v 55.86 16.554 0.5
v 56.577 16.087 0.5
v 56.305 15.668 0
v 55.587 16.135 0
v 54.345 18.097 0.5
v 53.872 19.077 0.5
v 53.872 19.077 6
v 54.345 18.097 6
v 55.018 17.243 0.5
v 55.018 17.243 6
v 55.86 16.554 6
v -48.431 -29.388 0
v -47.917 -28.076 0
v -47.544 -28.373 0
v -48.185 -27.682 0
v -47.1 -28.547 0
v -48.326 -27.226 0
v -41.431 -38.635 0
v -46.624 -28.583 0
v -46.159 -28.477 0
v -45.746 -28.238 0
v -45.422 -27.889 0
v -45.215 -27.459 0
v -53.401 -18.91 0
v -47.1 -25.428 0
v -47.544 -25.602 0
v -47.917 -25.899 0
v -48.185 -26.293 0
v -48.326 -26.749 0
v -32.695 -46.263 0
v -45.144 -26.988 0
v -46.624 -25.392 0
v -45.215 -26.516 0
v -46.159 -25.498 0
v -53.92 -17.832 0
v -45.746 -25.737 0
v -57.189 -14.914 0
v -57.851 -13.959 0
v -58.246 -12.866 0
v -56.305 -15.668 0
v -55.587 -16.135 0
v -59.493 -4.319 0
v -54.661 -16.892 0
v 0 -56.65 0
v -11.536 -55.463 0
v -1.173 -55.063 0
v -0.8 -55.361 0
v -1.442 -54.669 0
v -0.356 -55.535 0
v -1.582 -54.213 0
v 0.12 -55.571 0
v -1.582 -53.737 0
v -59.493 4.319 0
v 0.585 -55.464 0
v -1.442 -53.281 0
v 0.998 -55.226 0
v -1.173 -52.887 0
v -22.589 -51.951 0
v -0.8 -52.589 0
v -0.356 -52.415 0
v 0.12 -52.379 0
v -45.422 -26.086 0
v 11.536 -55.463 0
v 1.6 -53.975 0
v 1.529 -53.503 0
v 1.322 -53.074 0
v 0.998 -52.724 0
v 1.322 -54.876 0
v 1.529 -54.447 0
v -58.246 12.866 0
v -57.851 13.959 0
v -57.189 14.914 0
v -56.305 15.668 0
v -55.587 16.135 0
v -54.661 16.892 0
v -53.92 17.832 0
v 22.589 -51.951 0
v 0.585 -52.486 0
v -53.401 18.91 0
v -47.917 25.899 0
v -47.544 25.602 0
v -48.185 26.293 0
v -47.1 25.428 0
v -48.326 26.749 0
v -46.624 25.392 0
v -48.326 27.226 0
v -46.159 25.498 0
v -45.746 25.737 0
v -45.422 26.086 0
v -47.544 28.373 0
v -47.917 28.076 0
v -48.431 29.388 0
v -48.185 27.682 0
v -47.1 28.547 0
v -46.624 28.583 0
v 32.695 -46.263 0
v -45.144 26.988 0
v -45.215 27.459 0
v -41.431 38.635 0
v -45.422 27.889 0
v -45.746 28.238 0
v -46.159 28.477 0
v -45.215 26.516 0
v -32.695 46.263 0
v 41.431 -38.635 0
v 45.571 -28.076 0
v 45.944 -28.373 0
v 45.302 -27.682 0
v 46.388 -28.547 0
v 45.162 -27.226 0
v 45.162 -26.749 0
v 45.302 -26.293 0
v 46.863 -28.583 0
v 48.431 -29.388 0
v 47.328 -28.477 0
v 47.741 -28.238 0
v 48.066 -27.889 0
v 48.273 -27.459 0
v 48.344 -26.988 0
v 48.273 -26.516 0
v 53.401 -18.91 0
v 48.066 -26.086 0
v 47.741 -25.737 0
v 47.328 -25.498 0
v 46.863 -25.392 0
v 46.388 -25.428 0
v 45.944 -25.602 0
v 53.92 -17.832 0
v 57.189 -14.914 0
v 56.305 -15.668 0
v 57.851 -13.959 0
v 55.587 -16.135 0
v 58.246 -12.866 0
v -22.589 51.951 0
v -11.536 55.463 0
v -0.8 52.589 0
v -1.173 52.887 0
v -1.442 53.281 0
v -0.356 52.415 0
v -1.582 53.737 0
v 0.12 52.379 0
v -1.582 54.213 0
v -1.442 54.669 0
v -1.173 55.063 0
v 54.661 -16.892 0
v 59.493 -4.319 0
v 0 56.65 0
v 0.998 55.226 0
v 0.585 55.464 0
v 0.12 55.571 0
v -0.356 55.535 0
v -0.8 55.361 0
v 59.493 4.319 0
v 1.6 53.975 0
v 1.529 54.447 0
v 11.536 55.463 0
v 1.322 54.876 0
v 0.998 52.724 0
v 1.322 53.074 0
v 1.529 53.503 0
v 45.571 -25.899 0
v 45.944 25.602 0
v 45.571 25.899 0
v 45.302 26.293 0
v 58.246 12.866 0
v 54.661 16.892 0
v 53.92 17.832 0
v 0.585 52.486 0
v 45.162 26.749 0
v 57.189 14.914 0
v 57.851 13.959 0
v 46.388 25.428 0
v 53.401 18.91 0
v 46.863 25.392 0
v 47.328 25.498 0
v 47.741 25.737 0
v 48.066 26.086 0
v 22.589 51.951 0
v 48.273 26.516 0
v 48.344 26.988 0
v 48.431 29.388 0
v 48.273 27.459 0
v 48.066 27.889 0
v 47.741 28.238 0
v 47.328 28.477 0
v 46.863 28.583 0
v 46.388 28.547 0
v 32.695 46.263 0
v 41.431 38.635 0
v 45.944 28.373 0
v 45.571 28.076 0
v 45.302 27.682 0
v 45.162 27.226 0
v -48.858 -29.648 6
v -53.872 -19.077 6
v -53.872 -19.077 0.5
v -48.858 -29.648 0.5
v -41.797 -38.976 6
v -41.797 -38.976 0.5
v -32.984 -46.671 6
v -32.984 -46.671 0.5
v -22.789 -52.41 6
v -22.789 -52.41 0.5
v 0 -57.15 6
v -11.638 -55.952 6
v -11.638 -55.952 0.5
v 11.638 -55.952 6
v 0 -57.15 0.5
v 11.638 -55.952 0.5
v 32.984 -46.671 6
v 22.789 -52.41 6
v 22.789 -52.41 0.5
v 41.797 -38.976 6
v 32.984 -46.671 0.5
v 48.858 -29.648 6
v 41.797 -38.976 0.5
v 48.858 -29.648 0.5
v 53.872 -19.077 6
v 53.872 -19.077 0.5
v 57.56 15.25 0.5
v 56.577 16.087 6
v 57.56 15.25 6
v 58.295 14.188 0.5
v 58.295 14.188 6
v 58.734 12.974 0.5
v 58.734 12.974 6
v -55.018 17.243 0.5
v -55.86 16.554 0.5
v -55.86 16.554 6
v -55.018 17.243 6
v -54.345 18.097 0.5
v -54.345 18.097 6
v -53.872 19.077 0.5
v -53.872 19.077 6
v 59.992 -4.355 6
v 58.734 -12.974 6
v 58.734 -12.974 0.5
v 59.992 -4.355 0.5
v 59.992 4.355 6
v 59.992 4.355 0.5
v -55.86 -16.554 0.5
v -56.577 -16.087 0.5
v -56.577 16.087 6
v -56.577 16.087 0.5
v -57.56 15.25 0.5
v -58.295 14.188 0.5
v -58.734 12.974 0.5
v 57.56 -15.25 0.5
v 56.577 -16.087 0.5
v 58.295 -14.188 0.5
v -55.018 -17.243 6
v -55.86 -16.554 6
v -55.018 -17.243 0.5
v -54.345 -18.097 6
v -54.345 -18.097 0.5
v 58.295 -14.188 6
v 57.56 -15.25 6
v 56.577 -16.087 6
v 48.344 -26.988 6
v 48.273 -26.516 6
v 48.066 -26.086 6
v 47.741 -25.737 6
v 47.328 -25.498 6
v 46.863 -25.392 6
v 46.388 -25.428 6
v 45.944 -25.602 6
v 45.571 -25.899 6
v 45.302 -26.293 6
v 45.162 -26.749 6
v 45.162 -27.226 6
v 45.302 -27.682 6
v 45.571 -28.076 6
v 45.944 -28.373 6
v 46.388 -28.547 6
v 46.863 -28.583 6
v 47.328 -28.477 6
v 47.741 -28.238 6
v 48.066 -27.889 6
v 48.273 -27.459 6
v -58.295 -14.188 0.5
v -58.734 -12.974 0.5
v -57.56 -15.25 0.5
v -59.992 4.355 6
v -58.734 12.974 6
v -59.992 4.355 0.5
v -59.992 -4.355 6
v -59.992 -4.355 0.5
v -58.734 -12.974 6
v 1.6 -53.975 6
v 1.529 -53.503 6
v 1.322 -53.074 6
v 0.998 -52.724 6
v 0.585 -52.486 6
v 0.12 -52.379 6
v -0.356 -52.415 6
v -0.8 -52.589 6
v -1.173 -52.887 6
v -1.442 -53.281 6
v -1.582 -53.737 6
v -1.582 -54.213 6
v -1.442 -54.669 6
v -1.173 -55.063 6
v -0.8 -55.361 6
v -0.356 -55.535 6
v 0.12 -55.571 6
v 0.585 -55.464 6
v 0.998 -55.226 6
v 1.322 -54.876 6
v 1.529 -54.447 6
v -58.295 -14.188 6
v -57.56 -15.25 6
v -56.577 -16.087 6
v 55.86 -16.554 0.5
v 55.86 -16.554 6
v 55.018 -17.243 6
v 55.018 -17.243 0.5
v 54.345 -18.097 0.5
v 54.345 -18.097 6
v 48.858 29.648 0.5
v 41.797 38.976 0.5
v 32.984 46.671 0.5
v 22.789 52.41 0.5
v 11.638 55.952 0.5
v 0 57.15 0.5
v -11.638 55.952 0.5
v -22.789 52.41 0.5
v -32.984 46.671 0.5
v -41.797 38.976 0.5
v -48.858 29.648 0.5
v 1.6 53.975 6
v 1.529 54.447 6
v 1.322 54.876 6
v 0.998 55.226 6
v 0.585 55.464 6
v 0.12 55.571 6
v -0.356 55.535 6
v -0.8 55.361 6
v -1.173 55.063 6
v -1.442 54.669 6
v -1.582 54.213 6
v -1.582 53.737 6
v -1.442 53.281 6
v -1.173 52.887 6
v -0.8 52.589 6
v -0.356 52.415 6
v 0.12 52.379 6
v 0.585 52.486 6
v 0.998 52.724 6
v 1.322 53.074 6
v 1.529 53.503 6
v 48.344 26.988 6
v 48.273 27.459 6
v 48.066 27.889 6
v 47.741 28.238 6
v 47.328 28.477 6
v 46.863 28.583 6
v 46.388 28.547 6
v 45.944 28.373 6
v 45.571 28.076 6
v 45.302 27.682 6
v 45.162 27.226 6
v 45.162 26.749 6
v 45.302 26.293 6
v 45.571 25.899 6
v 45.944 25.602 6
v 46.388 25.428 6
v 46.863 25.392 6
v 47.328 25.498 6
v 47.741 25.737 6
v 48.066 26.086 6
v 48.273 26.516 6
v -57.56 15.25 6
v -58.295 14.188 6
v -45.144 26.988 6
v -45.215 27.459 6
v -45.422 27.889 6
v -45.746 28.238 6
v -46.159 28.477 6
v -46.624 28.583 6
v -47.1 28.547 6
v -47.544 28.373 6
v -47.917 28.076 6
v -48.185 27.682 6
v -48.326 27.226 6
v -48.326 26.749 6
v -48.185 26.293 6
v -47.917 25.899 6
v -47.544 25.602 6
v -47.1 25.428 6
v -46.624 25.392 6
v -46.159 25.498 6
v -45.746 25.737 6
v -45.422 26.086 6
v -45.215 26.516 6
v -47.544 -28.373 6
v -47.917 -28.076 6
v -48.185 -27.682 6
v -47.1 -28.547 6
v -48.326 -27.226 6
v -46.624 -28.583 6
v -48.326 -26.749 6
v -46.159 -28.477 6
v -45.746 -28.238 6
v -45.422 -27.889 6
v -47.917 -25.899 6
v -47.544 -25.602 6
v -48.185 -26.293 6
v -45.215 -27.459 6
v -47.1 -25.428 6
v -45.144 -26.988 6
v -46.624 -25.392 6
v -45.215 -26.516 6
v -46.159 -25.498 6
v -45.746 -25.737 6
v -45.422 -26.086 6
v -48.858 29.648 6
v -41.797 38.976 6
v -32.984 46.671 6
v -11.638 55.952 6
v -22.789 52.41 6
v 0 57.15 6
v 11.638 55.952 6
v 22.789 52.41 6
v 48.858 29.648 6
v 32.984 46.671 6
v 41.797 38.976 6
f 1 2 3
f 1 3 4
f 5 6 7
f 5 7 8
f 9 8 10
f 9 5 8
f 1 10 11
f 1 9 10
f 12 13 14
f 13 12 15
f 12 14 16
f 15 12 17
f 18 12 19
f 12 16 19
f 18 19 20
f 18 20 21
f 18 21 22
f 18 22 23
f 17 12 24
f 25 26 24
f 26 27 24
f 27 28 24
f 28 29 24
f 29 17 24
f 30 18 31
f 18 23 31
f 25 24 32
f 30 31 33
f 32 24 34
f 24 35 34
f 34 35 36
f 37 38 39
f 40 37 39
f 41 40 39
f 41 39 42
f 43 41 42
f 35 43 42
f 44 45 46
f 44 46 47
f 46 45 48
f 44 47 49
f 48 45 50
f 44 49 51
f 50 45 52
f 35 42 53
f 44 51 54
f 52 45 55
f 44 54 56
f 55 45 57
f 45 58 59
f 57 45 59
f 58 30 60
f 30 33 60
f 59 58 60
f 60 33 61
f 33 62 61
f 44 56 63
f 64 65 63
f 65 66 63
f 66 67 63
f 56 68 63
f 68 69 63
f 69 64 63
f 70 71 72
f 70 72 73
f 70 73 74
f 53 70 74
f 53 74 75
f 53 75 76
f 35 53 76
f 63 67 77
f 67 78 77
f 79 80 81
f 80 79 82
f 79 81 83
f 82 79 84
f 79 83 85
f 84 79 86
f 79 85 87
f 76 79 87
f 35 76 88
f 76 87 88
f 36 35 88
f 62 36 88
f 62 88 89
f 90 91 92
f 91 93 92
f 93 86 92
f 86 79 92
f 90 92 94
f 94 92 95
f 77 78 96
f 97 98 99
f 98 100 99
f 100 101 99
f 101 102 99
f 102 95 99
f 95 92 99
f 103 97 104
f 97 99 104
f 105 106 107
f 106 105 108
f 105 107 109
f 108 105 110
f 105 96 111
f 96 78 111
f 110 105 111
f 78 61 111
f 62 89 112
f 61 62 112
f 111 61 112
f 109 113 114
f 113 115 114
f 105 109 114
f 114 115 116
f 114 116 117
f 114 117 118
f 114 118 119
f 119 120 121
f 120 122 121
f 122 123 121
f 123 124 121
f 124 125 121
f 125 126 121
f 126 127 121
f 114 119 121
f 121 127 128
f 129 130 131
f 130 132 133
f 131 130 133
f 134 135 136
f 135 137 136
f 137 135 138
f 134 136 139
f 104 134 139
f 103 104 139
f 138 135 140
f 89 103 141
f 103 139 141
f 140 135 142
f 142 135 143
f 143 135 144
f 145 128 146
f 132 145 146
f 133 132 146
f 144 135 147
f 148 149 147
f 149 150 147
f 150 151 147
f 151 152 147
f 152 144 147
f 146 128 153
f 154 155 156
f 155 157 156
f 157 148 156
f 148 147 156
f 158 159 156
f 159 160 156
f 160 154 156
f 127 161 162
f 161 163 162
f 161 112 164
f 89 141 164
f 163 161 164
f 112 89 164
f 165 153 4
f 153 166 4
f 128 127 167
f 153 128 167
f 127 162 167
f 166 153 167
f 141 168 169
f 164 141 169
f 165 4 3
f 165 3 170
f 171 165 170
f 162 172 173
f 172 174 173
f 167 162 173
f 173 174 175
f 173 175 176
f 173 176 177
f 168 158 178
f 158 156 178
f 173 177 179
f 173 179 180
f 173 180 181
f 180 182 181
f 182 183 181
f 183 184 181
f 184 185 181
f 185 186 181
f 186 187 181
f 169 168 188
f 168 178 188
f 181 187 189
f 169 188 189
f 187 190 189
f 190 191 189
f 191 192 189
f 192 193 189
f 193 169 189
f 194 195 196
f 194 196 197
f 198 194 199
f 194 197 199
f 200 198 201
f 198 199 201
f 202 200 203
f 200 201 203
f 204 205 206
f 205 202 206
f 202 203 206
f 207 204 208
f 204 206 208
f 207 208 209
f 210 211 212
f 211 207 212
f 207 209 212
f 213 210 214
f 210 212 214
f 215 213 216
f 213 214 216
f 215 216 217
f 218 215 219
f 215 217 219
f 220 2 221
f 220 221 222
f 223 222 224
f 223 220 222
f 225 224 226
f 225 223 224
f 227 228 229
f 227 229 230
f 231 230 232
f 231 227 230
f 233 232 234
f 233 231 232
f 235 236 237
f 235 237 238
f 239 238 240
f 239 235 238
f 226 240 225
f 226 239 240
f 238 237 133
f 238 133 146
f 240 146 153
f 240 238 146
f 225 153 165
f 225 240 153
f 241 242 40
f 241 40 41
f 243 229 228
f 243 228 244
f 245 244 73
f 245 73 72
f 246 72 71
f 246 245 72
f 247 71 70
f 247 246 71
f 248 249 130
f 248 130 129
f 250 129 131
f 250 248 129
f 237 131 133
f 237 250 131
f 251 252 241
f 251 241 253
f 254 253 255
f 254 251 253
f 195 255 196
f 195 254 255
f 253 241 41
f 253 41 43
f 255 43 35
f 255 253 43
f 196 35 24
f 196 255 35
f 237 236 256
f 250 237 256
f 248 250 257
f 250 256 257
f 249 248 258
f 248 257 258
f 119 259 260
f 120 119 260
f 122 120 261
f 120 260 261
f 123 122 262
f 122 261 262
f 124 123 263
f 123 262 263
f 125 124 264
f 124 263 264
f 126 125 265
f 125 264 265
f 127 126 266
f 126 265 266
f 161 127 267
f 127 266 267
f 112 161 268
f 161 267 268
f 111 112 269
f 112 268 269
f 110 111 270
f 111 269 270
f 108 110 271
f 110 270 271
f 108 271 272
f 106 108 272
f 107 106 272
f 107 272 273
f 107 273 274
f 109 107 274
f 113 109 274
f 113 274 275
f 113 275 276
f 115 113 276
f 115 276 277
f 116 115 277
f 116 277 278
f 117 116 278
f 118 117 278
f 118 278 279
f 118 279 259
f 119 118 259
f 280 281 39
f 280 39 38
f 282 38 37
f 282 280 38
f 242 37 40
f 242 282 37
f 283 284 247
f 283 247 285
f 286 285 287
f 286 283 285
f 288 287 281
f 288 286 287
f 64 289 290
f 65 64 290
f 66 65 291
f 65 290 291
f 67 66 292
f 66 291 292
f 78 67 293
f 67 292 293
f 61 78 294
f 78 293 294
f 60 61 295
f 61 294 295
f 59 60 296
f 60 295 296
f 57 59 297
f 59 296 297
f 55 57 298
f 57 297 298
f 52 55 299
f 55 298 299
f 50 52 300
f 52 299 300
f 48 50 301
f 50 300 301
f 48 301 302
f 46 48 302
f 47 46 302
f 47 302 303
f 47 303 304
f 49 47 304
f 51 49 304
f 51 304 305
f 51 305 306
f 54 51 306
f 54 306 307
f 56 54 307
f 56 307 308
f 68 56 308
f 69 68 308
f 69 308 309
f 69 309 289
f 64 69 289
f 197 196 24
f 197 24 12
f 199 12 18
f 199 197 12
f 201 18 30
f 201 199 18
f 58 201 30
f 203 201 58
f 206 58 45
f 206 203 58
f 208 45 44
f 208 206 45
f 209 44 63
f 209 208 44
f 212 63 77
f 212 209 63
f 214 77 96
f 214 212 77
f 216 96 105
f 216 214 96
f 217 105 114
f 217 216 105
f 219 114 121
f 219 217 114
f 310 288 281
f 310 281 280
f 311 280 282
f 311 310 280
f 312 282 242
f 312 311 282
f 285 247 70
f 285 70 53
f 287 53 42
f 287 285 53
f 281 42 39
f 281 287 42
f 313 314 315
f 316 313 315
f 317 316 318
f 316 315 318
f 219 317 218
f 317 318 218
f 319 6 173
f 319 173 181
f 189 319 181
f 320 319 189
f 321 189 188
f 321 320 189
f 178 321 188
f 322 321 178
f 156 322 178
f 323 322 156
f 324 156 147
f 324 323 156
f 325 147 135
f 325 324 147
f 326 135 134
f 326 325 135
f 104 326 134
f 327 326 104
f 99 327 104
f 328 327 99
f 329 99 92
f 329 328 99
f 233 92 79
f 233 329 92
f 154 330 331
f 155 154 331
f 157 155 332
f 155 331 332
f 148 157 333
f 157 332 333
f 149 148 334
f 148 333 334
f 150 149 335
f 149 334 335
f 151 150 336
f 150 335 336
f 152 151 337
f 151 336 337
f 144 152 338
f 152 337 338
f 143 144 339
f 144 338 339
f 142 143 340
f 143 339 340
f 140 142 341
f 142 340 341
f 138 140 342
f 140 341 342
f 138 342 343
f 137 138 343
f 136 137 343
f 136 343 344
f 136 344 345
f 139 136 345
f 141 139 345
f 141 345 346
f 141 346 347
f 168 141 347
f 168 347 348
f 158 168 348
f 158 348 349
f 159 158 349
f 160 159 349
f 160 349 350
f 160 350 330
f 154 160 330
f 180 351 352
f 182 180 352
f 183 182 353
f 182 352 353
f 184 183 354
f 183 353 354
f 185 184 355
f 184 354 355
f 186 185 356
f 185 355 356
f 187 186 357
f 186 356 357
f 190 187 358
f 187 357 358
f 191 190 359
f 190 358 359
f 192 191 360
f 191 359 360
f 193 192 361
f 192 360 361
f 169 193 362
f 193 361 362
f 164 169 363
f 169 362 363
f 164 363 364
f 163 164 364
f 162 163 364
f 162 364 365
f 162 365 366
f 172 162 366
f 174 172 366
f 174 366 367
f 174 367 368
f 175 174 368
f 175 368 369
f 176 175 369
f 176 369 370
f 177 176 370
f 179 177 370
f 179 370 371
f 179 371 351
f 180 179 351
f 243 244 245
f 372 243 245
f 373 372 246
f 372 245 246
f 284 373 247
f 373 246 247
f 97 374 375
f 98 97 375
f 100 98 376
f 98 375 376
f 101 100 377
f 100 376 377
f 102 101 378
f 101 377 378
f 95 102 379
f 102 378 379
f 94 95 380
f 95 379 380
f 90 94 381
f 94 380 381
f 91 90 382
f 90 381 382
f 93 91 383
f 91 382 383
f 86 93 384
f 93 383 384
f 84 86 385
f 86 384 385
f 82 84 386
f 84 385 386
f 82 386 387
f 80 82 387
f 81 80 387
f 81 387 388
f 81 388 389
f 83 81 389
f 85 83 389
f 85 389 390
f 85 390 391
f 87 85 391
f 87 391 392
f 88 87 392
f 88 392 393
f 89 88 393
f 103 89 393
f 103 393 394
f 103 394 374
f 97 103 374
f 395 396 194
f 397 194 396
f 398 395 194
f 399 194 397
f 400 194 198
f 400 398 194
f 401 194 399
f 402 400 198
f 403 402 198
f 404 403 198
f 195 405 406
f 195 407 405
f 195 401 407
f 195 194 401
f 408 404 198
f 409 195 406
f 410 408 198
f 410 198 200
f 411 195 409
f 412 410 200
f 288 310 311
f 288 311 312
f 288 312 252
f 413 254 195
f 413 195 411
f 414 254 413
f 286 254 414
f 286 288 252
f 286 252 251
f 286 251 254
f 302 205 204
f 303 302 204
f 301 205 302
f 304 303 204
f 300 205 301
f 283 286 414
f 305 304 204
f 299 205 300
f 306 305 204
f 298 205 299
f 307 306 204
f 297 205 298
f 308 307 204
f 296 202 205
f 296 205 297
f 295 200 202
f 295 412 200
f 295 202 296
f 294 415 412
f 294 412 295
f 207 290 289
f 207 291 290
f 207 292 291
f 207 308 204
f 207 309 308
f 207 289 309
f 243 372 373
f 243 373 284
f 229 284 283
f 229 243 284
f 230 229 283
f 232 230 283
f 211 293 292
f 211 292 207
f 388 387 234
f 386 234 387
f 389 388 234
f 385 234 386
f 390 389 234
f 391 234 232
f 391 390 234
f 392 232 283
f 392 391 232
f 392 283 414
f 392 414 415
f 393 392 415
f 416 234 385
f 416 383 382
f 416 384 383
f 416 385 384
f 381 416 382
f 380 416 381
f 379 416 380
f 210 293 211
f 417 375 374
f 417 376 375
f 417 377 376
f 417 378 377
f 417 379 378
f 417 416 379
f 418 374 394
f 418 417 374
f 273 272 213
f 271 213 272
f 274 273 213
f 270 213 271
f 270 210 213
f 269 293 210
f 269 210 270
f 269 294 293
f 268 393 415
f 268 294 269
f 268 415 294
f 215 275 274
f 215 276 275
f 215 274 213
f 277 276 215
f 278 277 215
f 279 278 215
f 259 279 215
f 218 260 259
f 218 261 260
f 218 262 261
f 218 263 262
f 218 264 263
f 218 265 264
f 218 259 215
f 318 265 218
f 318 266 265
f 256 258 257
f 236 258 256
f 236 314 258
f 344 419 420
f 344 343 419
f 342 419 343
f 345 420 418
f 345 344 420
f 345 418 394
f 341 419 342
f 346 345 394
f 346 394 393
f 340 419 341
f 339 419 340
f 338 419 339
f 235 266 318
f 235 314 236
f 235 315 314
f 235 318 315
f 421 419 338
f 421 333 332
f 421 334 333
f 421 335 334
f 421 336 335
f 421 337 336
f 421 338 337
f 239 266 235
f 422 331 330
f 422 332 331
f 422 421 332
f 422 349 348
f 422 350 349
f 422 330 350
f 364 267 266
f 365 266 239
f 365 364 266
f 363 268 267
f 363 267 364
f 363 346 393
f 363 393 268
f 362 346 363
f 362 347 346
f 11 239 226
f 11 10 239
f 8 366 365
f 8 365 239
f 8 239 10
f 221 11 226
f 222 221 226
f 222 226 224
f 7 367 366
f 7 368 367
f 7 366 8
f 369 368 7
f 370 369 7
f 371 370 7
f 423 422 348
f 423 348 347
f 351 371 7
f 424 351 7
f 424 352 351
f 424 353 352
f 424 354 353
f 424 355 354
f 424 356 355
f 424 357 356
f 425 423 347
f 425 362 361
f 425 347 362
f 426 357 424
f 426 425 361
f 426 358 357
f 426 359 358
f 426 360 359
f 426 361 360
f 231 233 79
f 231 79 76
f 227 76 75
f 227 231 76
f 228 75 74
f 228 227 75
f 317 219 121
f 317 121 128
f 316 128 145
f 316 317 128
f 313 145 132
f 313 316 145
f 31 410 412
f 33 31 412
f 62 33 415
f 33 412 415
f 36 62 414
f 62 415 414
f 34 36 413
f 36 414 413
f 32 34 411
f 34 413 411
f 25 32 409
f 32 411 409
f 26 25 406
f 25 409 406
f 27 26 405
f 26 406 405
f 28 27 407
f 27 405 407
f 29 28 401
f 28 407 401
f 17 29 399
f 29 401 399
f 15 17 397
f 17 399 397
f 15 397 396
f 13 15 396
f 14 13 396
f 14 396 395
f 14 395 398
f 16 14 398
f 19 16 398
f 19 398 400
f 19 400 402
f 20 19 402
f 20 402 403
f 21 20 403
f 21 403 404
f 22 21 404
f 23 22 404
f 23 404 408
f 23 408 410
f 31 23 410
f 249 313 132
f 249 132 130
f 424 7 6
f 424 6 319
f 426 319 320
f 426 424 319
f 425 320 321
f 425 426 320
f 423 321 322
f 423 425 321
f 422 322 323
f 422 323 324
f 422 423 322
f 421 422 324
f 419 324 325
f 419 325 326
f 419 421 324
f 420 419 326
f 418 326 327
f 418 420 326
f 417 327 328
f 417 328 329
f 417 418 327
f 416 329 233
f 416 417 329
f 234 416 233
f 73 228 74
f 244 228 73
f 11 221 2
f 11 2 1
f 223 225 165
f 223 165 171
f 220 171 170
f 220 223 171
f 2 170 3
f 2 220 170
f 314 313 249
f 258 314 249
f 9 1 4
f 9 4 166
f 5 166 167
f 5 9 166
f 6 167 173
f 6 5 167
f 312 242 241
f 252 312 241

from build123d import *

# Parameters (mm, degrees)
EXTRUDE_1_DEPTH             = 6
CUT_EXTRUDE_1_DEPTH         = 7
HOLE_WIZARD_3_2_3_2_1_D     = 3.2
HOLE_WIZARD_3_2_3_2_1_DEPTH = 6
FILLET_1_R                  = 5
CHAMFER_1_SIZE              = 0.5


with BuildPart() as part:
    # 草图1 → 凸台-拉伸1 (new body)
    with BuildSketch(Plane.XY.offset(6)):
        with BuildLine():
            Line((-54.404710274, 17.5), (-58.249656651, 15))
            ThreePointArc((-58.249656651, 15), (0, -60.15), (58.249656651, 15))
            Line((58.249656651, 15), (54.404710274, 17.5))
            ThreePointArc((54.404710274, 17.5), (0, 57.15), (-54.404710274, 17.5))
        make_face()
    extrude(amount=-EXTRUDE_1_DEPTH)

    # 草图2 → 切除-拉伸1 (cut, through all)
    with BuildSketch(Plane(origin=(0, 0, 0), x_dir=(-1, 0, 0), z_dir=(0, 0, -1))):
        with BuildLine():
            Line((58.249656651, -15), (54.404710274, -17.5))
            ThreePointArc((54.404710274, -17.5), (0, -57.15), (-54.404710274, -17.5))
            Line((-54.404710274, -17.5), (-58.249656651, -15))
            ThreePointArc((-58.249656651, -15), (0, -60.15), (58.249656651, -15))
        make_face()
    extrude(amount=-CUT_EXTRUDE_1_DEPTH, mode=Mode.SUBTRACT)

    # Ø3.2 (3.2) 直径孔1
    with Locations(Plane(origin=(0, 0, 0), x_dir=(-1, 0, 0), z_dir=(0, 0, -1))):
        with Locations((0, 53.975), (46.743721169, -26.9875), (-46.743721169, 26.9875), (-46.743721169, -26.9875), (0, -53.975), (46.743721169, 26.9875)):
            Hole(HOLE_WIZARD_3_2_3_2_1_D / 2, depth=HOLE_WIZARD_3_2_3_2_1_DEPTH)

    # 圆角1
    fillet_1_edges = [part.edges().sort_by_distance(p)[0] for p in [
        (-58.249656651, -15, 3),
        (58.249656651, -15, 3),
        (54.404710274, -17.5, 3),
        (-54.404710274, -17.5, 3),
        (54.404710274, 17.5, 3),
        (58.249656651, 15, 3),
        (-58.249656651, 15, 3),
        (-54.404710274, 17.5, 3),
    ]]
    fillet(fillet_1_edges, radius=FILLET_1_R)

    # 倒角1
    chamfer_1_edges = [part.edges().sort_by_distance(p)[0] for p in [
        (0, -57.15, 0),
        (-56.218559502, -16.320627747, 0),
        (60.15, 0, 0),
        (56.218559502, 16.320627747, 0),
        (56.218559502, -16.320627747, 0),
        (-60.15, 0, 0),
        (-56.218559502, 16.320627747, 0),
        (0, 57.15, 0),
        (-57.961950962, 14.742761538, 0),
        (57.961950962, -14.742761538, 0),
        (-57.961950962, -14.742761538, 0),
        (57.961950962, 14.742761538, 0),
        (-54.657828511, -17.651398409, 0),
        (54.657828511, -17.651398409, 0),
        (54.657828511, 17.651398409, 0),
        (-54.657828511, 17.651398409, 0),
    ]]
    chamfer(chamfer_1_edges, length=CHAMFER_1_SIZE)


solid = part.part
